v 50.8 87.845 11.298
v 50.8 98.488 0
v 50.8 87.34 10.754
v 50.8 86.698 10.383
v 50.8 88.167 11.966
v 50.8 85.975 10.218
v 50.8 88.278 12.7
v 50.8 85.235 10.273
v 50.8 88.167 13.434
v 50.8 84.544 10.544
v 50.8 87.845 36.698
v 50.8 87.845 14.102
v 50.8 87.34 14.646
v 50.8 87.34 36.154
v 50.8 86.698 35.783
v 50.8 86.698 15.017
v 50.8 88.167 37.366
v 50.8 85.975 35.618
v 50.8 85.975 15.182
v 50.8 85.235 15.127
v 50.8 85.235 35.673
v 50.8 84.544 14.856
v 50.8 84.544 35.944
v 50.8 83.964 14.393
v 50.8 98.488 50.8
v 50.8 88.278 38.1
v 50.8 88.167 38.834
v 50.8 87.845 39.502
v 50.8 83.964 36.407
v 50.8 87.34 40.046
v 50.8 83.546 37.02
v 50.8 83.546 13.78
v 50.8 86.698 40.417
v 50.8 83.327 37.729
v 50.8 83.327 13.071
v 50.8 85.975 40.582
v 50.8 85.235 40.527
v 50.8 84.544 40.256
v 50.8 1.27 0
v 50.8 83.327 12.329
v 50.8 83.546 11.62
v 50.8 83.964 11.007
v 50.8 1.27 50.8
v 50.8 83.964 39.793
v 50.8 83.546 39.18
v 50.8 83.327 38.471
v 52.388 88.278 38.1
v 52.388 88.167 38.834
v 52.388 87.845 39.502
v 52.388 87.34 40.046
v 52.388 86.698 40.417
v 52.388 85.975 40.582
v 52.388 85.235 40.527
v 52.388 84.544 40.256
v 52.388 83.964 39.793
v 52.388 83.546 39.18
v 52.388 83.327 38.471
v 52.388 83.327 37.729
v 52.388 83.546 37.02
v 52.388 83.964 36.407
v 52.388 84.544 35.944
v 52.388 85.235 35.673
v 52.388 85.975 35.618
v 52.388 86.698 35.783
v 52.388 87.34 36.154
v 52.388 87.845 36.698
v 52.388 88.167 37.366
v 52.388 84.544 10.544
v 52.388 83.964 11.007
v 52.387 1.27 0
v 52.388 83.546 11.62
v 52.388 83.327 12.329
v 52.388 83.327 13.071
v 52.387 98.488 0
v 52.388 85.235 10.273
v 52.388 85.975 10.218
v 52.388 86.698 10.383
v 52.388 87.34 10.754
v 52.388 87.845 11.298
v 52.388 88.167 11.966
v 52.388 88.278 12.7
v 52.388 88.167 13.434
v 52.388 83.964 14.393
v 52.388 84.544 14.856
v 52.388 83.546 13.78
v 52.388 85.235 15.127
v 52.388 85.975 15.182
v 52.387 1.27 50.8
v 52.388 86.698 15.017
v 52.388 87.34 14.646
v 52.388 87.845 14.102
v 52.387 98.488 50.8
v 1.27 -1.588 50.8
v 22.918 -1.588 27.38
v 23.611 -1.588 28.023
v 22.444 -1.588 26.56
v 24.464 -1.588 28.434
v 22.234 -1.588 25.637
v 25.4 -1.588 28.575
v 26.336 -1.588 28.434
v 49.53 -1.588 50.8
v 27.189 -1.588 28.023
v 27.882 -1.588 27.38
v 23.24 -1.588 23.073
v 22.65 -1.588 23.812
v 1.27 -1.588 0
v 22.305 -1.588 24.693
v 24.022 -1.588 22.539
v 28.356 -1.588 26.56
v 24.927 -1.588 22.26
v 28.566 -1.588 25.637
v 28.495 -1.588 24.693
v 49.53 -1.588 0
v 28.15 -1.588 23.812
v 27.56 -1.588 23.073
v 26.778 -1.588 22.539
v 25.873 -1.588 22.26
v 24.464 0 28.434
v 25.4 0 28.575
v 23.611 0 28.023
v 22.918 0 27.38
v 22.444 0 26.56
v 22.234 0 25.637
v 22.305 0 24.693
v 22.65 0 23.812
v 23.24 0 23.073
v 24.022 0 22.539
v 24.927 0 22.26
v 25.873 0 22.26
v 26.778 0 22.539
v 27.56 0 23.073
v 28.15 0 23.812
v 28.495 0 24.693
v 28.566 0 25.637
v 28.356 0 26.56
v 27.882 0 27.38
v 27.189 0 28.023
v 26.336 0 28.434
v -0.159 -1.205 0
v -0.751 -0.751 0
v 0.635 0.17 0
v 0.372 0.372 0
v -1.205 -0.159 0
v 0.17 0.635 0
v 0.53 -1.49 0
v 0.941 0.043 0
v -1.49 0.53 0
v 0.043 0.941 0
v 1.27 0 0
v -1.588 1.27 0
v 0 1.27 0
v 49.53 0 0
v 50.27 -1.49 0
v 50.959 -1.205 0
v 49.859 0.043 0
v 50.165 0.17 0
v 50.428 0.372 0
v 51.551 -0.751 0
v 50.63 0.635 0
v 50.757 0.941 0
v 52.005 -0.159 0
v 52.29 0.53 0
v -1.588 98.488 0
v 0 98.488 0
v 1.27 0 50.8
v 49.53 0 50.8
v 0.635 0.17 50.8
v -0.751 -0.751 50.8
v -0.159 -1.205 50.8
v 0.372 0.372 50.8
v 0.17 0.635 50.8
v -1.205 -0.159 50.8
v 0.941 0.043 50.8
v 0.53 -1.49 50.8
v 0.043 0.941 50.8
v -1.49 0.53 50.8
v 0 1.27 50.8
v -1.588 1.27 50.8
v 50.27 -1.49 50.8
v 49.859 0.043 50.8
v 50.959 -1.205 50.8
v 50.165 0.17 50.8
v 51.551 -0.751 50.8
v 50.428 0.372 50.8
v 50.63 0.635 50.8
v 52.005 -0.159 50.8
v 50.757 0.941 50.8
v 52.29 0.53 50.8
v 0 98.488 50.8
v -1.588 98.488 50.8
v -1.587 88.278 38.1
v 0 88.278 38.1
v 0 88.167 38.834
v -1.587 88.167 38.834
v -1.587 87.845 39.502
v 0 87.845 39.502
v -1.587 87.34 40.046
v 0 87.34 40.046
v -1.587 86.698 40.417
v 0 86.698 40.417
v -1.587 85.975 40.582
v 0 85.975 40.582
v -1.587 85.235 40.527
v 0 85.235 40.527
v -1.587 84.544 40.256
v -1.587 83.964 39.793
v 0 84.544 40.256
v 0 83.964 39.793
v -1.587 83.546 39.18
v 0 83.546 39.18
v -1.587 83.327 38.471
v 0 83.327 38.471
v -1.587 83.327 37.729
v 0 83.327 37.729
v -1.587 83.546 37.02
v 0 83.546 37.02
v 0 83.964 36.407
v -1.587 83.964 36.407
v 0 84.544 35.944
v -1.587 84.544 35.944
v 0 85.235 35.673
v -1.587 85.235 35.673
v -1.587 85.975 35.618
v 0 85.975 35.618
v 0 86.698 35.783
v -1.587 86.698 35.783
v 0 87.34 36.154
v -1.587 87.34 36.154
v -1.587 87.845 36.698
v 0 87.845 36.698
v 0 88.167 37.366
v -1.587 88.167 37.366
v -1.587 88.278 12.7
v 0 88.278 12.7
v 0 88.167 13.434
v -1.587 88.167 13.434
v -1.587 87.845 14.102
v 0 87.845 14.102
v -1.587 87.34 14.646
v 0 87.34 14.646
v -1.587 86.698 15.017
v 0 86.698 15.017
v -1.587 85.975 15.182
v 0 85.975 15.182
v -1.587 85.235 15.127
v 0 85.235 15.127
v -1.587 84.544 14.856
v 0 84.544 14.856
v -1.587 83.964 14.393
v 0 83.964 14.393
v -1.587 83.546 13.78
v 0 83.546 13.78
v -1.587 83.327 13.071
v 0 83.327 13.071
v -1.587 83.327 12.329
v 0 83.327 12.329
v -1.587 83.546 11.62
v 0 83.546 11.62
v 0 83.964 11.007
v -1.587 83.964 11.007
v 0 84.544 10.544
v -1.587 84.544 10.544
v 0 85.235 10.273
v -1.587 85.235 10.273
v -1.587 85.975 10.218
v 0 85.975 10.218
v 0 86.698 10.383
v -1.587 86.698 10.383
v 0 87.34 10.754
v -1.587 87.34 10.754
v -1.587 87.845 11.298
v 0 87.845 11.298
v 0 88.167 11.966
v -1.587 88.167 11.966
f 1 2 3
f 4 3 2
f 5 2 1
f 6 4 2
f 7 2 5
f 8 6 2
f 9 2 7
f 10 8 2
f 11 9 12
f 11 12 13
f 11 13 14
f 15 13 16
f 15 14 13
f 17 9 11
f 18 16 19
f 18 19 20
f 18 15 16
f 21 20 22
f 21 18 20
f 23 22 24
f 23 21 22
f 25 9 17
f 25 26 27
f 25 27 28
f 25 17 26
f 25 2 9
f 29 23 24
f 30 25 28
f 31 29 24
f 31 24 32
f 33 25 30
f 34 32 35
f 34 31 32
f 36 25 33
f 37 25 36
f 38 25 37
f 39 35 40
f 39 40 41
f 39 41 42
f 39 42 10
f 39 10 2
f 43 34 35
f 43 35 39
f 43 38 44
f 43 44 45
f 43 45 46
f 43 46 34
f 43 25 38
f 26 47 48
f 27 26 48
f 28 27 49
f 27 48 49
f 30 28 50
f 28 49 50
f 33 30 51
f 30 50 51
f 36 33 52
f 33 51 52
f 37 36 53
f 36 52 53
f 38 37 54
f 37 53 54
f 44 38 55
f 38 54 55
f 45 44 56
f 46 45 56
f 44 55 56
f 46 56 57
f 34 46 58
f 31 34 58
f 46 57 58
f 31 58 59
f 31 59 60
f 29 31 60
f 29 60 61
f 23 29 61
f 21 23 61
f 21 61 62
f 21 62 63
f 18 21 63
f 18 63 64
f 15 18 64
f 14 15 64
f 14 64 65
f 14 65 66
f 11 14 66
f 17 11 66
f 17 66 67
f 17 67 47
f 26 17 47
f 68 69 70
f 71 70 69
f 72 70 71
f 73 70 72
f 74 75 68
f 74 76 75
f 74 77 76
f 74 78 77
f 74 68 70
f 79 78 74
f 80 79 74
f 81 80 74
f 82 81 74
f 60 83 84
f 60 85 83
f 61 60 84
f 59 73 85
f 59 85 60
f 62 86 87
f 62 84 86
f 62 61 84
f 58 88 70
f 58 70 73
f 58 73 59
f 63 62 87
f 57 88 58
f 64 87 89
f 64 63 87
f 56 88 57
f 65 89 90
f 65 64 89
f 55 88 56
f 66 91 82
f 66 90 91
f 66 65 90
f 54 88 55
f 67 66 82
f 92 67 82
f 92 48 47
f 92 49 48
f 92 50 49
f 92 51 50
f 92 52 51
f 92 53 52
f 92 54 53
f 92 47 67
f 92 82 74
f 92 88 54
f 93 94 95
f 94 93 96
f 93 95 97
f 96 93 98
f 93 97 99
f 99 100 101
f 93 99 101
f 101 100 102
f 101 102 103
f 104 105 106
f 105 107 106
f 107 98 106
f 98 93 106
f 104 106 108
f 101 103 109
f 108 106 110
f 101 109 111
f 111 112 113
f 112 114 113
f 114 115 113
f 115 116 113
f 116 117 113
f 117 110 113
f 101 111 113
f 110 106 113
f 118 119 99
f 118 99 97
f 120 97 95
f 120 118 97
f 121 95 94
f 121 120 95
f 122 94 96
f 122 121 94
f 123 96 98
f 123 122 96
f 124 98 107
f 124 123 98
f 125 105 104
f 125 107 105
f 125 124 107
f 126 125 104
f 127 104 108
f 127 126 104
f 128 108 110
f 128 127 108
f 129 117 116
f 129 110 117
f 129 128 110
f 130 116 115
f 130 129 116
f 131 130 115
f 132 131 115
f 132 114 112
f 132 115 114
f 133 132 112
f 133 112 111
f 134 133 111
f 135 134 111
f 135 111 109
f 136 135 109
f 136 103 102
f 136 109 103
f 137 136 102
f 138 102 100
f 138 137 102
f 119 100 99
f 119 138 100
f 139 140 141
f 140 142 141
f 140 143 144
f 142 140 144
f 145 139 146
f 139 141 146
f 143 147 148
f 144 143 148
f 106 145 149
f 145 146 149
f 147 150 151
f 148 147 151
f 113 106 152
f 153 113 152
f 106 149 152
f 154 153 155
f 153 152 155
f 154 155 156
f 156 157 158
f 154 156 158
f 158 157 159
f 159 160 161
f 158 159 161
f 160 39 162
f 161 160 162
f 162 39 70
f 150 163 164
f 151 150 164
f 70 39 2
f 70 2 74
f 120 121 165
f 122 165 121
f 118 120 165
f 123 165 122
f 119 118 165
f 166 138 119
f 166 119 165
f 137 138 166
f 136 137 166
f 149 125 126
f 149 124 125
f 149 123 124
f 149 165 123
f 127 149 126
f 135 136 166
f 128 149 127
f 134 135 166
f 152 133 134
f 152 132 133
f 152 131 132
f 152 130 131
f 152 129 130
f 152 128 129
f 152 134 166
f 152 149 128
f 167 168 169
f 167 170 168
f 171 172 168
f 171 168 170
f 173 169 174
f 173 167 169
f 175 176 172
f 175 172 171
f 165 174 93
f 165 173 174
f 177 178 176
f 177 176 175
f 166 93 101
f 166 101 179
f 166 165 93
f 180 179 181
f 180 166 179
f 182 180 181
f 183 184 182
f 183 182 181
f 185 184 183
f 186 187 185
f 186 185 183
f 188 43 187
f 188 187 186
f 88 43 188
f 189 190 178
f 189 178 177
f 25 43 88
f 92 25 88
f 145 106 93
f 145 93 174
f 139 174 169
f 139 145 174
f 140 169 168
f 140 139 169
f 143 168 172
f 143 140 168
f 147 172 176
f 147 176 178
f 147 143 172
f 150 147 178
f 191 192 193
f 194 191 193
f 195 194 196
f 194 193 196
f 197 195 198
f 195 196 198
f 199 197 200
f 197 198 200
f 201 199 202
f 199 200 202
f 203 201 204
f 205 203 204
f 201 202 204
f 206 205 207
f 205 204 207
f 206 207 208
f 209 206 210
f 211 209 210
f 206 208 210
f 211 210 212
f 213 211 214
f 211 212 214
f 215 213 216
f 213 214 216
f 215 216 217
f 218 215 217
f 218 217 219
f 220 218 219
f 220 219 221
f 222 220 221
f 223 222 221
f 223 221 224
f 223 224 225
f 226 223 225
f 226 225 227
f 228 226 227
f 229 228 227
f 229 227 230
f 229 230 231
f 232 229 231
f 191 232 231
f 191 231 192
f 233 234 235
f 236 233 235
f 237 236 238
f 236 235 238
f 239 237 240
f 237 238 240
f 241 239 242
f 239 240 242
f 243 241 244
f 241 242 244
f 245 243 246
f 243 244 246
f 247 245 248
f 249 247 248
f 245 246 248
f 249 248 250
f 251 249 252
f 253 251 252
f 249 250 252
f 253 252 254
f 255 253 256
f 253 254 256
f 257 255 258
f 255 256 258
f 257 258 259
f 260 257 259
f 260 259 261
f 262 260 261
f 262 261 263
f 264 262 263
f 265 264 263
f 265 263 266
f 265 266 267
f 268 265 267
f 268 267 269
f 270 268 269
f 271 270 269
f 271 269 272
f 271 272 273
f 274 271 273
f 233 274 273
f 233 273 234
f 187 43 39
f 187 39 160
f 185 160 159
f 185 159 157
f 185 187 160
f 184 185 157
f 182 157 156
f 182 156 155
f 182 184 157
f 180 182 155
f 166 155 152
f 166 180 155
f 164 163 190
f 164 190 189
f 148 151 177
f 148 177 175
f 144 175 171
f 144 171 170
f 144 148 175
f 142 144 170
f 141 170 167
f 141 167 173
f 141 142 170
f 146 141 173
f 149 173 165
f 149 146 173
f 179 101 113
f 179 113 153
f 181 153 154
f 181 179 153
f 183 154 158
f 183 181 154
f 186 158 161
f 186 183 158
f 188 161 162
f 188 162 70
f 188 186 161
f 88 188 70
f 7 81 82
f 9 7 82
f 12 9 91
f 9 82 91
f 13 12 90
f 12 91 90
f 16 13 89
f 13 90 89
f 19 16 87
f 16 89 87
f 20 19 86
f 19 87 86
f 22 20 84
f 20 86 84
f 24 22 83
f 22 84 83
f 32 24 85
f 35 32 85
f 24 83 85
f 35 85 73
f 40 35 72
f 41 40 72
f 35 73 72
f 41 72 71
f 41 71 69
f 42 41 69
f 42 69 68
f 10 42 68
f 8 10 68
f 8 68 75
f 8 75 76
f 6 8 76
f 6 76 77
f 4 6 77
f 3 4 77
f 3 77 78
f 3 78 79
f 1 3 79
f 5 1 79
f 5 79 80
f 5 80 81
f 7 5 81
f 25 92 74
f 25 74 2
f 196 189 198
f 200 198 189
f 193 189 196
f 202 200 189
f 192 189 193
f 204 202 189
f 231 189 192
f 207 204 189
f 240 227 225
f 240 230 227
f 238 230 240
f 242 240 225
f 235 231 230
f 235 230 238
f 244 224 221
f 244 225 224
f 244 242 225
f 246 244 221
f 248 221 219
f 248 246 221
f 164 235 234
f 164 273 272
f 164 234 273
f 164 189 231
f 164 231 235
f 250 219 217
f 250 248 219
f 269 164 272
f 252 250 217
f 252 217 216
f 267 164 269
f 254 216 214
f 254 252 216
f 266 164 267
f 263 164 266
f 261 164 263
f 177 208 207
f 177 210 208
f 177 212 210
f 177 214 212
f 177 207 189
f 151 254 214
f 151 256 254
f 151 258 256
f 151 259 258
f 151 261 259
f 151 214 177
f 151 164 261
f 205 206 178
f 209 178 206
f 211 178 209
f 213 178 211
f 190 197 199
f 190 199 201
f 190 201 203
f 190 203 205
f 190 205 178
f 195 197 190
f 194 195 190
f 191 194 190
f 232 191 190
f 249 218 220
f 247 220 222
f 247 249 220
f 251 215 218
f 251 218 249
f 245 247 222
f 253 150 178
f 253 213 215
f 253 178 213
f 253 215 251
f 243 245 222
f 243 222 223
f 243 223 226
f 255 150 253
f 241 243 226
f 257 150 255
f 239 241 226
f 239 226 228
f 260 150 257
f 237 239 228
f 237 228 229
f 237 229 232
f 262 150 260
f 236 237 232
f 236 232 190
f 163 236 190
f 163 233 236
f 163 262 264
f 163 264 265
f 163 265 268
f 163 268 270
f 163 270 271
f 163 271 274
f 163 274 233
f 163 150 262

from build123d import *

# Parameters (mm, degrees)
SKETCH9_W                    = 50.8
SKETCH9_H                    = 1.5875
BASE_FLANGE1_DEPTH           = 50.8
EDGE_FLANGE1_STRIP_W         = 8.89
EDGE_FLANGE1_STRIP_H         = 1.5875
EDGE_FLANGE1_STRIP_CUT_DEPTH = 50.8
EDGE_FLANGE1_DEPTH           = 50.8
EDGE_FLANGE2_STRIP_W         = 8.89
EDGE_FLANGE2_STRIP_H         = 1.5875
EDGE_FLANGE2_STRIP_CUT_DEPTH = 50.8
EDGE_FLANGE2_DEPTH           = 50.8
SKETCH20_R                   = 2.4892
CUT_EXTRUDE1_DEPTH           = 124.263641262
CUT_EXTRUDE2_DEPTH           = 124.855948312
CUT_EXTRUDE2_DEPTH_BACK      = 124.855948312
SKETCH21_R                   = 3.175


# Sheet-metal steps are written as plain solids
with BuildPart() as part:
    # Sketch9 → Base-Flange1 (new body)
    with BuildSketch(Plane.XY):
        with Locations((25.4, -0.79375)):
            Rectangle(SKETCH9_W, SKETCH9_H)
    extrude(amount=BASE_FLANGE1_DEPTH)

    # Edge-Flange1 strip (across the edge) → Edge-Flange1 strip cut (cut)
    with BuildSketch(Plane.XY):
        with Locations((-3.175, -0.79375)):
            Rectangle(EDGE_FLANGE1_STRIP_W, EDGE_FLANGE1_STRIP_H)
    extrude(amount=EDGE_FLANGE1_STRIP_CUT_DEPTH, mode=Mode.SUBTRACT)

    # Edge-Flange1 section (across the edge) → Edge-Flange1 (add)
    with BuildSketch(Plane.XY):
        with BuildLine():
            Line((-1.5875, 1.27), (-1.5875, 98.4885))
            Line((-1.5875, 98.4885), (0, 98.4885))
            Line((0, 98.4885), (0, 1.27))
            ThreePointArc((0, 1.27), (0.371974388, 0.371974388), (1.27, 0))
            Line((1.27, 0), (1.27, -1.5875))
            ThreePointArc((1.27, -1.5875), (-0.750557627, -0.750557627), (-1.5875, 1.27))
        make_face()
    extrude(amount=EDGE_FLANGE1_DEPTH)

    # Edge-Flange2 strip (across the edge) → Edge-Flange2 strip cut (cut)
    with BuildSketch(Plane(origin=(50.8, 0, 50.8), x_dir=(-1, 0, 0), z_dir=(0, 0, -1))):
        with Locations((-3.175, -0.79375)):
            Rectangle(EDGE_FLANGE2_STRIP_W, EDGE_FLANGE2_STRIP_H)
    extrude(amount=EDGE_FLANGE2_STRIP_CUT_DEPTH, mode=Mode.SUBTRACT)

    # Edge-Flange2 section (across the edge) → Edge-Flange2 (add)
    with BuildSketch(Plane(origin=(50.8, 0, 50.8), x_dir=(-1, 0, 0), z_dir=(0, 0, -1))):
        with BuildLine():
            Line((-1.5875, 1.27), (-1.5875, 98.4885))
            Line((-1.5875, 98.4885), (0, 98.4885))
            Line((0, 98.4885), (0, 1.27))
            ThreePointArc((0, 1.27), (0.371974388, 0.371974388), (1.27, 0))
            Line((1.27, 0), (1.27, -1.5875))
            ThreePointArc((1.27, -1.5875), (-0.750557627, -0.750557627), (-1.5875, 1.27))
        make_face()
    extrude(amount=EDGE_FLANGE2_DEPTH)

    # Sketch20 → Cut-Extrude1 (cut, through all)
    with BuildSketch(Plane(origin=(52.3875, 0, 0), x_dir=(0, 0, -1), z_dir=(1, 0, 0))):
        with Locations(Location((-38.1, 85.7885, 0), (0, 0, 90))):
            Circle(SKETCH20_R)
        with Locations(Location((-12.7, 85.7885, 0), (0, 0, 90))):
            Circle(SKETCH20_R)
    extrude(amount=-CUT_EXTRUDE1_DEPTH, mode=Mode.SUBTRACT)

    # Sketch21 → Cut-Extrude2 (cut, two sides: drawn at the far end of the back side and taken through both)
    with BuildSketch(Plane.XZ.offset(1.5875).offset(-CUT_EXTRUDE2_DEPTH_BACK)):
        with Locations(Location((25.4, 25.4, 0), (0, 0, 90))):
            Circle(SKETCH21_R)
    extrude(amount=CUT_EXTRUDE2_DEPTH + CUT_EXTRUDE2_DEPTH_BACK, mode=Mode.SUBTRACT)


solid = part.part
